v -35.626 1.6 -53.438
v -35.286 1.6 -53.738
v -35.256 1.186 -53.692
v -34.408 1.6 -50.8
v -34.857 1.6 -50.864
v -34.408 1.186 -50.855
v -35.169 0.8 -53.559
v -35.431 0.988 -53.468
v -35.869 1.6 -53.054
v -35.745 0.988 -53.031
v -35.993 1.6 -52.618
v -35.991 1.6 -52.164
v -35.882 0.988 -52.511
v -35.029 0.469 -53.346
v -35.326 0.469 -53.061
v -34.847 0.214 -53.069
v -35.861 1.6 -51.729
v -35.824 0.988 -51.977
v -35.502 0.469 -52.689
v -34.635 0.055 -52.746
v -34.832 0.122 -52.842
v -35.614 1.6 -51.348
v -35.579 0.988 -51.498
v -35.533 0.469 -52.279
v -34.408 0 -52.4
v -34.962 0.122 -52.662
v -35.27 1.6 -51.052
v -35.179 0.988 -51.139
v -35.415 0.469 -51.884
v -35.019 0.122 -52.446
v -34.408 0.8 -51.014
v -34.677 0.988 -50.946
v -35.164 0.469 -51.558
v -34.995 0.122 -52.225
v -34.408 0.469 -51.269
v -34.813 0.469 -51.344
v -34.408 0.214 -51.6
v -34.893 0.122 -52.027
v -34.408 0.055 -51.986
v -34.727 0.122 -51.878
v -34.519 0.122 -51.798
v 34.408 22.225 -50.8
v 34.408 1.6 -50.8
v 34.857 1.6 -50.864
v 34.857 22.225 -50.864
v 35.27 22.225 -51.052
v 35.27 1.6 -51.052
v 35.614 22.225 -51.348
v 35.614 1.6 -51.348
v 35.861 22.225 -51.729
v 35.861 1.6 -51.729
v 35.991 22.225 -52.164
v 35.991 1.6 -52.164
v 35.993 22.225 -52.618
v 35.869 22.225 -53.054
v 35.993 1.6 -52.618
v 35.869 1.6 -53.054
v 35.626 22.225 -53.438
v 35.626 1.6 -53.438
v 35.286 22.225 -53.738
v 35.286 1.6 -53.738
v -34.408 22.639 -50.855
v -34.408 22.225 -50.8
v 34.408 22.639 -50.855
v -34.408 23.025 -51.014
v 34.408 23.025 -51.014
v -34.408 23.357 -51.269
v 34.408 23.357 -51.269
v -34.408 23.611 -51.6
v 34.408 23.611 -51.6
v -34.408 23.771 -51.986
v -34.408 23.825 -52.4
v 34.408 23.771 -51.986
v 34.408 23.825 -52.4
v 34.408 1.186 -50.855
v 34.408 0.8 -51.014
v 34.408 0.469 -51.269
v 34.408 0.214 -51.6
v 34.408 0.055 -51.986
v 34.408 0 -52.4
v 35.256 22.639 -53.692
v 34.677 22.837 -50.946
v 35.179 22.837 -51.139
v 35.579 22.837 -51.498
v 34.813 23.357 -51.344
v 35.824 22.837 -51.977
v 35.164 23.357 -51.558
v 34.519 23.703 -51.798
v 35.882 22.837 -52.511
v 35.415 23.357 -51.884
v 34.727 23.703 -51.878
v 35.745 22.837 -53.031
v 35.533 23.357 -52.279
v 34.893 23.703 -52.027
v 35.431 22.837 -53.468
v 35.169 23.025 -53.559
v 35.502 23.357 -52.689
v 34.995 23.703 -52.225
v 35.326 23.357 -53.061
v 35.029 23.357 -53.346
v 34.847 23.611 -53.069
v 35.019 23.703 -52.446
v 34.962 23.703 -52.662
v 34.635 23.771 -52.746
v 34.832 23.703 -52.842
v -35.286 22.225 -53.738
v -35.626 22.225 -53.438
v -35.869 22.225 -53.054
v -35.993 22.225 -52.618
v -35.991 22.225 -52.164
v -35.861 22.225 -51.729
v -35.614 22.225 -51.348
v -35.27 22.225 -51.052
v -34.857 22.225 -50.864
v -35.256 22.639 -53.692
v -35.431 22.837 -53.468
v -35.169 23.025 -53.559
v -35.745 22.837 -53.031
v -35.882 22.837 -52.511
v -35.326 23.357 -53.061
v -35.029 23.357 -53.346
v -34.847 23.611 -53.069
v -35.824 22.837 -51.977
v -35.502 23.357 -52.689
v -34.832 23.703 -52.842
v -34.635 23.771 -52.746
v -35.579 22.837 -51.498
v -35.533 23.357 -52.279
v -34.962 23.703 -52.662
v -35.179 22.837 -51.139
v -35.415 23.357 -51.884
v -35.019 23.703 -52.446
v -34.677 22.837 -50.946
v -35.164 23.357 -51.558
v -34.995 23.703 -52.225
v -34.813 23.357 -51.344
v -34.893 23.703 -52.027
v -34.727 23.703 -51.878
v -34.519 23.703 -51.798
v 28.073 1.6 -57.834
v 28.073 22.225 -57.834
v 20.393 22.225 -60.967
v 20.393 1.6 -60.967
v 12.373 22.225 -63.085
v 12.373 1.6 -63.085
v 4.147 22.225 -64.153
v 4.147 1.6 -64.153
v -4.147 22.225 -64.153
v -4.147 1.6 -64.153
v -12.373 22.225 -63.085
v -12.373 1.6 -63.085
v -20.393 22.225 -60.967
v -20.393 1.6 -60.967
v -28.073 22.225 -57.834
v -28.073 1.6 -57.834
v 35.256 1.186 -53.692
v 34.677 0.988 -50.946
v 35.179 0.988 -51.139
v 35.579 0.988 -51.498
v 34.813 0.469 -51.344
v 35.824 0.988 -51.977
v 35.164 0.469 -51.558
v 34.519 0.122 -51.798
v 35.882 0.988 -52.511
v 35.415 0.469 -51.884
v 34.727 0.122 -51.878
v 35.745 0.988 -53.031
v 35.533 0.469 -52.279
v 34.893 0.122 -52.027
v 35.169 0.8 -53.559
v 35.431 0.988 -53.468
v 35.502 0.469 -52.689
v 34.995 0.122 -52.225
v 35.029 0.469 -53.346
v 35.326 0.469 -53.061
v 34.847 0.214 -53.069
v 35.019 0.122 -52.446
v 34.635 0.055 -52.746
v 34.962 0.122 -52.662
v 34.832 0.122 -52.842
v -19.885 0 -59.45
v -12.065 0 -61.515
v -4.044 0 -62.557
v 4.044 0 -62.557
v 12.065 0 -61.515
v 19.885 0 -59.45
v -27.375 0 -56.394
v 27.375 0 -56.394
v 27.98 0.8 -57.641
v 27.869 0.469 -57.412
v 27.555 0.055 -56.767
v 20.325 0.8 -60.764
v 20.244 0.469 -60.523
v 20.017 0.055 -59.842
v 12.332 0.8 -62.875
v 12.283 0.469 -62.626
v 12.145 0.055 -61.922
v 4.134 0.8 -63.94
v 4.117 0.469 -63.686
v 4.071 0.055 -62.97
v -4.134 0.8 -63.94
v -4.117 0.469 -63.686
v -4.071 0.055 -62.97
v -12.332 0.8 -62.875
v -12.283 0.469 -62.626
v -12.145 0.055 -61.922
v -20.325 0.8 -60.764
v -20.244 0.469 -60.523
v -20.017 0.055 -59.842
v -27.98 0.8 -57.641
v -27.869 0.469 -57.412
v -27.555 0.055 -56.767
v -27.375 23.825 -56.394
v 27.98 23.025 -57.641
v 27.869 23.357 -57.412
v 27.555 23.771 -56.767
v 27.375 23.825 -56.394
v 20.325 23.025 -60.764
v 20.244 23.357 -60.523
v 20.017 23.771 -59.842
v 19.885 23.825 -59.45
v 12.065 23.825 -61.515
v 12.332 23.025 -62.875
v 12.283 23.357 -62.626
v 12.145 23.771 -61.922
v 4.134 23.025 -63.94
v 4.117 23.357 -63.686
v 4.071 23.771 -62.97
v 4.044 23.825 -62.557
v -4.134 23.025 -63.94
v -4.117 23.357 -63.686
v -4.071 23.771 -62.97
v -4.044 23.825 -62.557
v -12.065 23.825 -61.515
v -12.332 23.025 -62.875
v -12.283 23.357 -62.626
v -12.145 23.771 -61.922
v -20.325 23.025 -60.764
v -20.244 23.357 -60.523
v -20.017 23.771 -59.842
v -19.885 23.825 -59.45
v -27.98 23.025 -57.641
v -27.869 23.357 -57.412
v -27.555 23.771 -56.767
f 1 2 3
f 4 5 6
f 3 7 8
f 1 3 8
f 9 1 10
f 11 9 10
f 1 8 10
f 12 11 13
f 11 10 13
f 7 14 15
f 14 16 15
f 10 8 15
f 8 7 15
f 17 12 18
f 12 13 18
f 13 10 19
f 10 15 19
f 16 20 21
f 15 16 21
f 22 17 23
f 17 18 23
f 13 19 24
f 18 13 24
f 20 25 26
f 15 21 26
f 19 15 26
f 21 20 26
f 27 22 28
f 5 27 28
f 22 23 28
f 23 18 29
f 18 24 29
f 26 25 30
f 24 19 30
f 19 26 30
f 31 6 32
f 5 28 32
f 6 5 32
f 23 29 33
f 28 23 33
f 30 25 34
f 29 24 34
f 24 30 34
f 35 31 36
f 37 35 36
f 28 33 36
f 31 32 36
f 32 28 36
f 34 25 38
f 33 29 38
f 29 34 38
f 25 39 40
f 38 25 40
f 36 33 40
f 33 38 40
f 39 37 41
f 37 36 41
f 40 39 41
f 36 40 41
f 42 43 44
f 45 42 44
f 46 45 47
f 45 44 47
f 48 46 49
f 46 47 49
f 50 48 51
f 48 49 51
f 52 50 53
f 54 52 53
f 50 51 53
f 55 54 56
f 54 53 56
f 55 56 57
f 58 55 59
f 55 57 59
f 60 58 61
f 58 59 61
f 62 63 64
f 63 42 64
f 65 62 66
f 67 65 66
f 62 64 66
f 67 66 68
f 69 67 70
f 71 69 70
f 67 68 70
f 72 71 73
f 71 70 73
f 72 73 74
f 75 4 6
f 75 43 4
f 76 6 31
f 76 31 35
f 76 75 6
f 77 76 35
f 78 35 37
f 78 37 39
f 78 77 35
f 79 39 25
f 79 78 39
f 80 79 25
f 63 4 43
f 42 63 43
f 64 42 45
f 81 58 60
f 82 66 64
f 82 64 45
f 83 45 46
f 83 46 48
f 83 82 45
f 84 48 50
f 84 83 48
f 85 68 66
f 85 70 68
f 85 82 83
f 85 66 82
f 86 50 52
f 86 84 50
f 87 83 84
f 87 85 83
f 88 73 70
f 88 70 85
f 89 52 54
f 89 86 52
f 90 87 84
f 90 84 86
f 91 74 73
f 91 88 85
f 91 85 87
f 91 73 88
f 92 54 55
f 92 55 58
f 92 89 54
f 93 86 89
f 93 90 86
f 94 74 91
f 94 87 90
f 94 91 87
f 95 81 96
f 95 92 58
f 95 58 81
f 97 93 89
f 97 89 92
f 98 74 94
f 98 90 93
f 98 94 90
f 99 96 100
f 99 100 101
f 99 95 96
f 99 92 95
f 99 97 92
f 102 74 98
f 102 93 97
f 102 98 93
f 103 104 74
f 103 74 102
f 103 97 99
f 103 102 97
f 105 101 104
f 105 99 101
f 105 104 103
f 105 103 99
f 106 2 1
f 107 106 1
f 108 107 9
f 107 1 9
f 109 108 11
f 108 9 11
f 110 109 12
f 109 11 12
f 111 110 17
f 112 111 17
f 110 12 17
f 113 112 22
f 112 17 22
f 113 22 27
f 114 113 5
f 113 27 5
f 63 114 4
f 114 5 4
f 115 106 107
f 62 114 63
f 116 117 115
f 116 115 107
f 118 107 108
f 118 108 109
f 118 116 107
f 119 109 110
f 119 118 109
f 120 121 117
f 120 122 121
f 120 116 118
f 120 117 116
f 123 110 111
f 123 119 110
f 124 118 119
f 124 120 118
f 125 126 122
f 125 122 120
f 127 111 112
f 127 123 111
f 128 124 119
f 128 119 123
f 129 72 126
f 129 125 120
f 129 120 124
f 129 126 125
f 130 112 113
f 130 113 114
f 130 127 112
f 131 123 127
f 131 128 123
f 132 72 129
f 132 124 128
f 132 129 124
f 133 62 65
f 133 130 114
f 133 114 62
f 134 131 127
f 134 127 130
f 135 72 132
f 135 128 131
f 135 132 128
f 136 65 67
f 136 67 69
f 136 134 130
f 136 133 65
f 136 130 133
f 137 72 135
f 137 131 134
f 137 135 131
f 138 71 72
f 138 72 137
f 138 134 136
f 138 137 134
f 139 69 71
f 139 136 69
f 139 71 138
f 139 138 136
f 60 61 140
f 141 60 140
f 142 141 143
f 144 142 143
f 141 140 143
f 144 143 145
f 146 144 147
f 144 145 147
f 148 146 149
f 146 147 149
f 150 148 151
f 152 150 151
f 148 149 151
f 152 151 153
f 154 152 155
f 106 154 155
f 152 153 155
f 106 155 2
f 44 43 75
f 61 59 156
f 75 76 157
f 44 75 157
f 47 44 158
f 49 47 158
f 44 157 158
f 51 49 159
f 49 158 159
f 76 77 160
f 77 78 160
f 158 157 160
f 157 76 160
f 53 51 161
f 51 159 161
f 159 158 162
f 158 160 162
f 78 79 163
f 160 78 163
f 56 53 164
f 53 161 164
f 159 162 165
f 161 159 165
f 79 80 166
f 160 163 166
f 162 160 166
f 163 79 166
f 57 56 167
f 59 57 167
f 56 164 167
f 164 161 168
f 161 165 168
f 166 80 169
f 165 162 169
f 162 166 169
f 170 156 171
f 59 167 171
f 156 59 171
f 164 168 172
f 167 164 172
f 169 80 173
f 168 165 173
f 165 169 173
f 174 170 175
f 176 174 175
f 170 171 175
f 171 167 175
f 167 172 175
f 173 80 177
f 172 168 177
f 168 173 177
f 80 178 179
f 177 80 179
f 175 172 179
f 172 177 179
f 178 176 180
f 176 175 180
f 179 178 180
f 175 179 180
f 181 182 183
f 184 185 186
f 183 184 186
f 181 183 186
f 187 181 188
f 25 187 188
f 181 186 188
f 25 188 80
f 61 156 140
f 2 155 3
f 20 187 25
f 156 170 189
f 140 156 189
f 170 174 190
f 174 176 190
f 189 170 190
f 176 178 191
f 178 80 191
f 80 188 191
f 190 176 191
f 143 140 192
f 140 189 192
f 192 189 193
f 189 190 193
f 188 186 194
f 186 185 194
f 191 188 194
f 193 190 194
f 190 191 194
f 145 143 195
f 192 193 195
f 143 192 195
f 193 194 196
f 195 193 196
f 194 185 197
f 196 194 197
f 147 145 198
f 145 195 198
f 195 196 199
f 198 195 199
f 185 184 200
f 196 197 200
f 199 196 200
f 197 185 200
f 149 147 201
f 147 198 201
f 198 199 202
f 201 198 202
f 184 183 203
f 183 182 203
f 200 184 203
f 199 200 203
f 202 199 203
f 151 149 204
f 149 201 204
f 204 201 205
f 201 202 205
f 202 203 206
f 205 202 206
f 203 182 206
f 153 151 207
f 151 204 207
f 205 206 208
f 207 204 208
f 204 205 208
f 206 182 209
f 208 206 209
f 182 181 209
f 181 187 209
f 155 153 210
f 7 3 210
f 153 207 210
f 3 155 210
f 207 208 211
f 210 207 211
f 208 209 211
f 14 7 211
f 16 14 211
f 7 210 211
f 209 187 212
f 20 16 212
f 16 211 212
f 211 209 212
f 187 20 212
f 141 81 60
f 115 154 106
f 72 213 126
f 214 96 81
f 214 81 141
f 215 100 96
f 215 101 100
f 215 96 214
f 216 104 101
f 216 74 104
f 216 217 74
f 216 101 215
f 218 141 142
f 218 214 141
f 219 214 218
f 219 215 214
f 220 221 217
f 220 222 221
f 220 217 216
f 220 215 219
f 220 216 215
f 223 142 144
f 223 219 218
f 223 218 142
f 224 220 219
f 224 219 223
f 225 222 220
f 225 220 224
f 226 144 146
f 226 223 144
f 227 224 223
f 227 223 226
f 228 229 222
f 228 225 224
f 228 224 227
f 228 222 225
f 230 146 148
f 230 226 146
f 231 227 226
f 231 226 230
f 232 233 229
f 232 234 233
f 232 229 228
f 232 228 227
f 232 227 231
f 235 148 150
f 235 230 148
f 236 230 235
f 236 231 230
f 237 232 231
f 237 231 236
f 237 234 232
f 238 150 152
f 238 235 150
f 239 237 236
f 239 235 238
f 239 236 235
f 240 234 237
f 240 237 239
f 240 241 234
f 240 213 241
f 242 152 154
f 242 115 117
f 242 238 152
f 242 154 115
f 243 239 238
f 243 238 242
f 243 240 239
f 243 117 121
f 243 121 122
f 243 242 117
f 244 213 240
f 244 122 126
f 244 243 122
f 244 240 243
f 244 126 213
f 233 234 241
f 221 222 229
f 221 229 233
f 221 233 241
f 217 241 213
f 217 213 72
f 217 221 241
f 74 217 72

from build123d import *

# Parameters (mm, degrees)
BOSS_EXTRUDE1_DEPTH = 23.8252
FILLET1_R           = 1.6002


with BuildPart() as part:
    # Sketch1 → Boss-Extrude1 (new body)
    with BuildSketch(Plane(origin=(0, 0, 0), x_dir=(1, 0, 0), z_dir=(0, 1, 0))):
        with BuildLine():
            Line((-34.407907286, 50.8), (34.407907286, 50.8))
            ThreePointArc((34.407907286, 50.8), (35.941054018, 51.941832093), (35.286229068, 53.737806402))
            ThreePointArc((35.286229068, 53.737806402), (0, 64.2874), (-35.286229068, 53.737806402))
            ThreePointArc((-35.286229068, 53.737806402), (-35.941054018, 51.941832093), (-34.407907286, 50.8))
        make_face()
    extrude(amount=BOSS_EXTRUDE1_DEPTH)

    # Fillet1
    fillet1_edges = [part.edges().sort_by_distance(p)[0] for p in [
        (-35.941054018, 23.8252, -51.941832093),
        (0, 23.8252, -50.8),
        (35.941054018, 23.8252, -51.941832093),
        (0, 0, -50.8),
        (-35.941054018, 0, -51.941832093),
        (0, 0, -64.2874),
        (35.941054018, 0, -51.941832093),
        (0, 23.8252, -64.2874),
    ]]
    fillet(fillet1_edges, radius=FILLET1_R)


solid = part.part
